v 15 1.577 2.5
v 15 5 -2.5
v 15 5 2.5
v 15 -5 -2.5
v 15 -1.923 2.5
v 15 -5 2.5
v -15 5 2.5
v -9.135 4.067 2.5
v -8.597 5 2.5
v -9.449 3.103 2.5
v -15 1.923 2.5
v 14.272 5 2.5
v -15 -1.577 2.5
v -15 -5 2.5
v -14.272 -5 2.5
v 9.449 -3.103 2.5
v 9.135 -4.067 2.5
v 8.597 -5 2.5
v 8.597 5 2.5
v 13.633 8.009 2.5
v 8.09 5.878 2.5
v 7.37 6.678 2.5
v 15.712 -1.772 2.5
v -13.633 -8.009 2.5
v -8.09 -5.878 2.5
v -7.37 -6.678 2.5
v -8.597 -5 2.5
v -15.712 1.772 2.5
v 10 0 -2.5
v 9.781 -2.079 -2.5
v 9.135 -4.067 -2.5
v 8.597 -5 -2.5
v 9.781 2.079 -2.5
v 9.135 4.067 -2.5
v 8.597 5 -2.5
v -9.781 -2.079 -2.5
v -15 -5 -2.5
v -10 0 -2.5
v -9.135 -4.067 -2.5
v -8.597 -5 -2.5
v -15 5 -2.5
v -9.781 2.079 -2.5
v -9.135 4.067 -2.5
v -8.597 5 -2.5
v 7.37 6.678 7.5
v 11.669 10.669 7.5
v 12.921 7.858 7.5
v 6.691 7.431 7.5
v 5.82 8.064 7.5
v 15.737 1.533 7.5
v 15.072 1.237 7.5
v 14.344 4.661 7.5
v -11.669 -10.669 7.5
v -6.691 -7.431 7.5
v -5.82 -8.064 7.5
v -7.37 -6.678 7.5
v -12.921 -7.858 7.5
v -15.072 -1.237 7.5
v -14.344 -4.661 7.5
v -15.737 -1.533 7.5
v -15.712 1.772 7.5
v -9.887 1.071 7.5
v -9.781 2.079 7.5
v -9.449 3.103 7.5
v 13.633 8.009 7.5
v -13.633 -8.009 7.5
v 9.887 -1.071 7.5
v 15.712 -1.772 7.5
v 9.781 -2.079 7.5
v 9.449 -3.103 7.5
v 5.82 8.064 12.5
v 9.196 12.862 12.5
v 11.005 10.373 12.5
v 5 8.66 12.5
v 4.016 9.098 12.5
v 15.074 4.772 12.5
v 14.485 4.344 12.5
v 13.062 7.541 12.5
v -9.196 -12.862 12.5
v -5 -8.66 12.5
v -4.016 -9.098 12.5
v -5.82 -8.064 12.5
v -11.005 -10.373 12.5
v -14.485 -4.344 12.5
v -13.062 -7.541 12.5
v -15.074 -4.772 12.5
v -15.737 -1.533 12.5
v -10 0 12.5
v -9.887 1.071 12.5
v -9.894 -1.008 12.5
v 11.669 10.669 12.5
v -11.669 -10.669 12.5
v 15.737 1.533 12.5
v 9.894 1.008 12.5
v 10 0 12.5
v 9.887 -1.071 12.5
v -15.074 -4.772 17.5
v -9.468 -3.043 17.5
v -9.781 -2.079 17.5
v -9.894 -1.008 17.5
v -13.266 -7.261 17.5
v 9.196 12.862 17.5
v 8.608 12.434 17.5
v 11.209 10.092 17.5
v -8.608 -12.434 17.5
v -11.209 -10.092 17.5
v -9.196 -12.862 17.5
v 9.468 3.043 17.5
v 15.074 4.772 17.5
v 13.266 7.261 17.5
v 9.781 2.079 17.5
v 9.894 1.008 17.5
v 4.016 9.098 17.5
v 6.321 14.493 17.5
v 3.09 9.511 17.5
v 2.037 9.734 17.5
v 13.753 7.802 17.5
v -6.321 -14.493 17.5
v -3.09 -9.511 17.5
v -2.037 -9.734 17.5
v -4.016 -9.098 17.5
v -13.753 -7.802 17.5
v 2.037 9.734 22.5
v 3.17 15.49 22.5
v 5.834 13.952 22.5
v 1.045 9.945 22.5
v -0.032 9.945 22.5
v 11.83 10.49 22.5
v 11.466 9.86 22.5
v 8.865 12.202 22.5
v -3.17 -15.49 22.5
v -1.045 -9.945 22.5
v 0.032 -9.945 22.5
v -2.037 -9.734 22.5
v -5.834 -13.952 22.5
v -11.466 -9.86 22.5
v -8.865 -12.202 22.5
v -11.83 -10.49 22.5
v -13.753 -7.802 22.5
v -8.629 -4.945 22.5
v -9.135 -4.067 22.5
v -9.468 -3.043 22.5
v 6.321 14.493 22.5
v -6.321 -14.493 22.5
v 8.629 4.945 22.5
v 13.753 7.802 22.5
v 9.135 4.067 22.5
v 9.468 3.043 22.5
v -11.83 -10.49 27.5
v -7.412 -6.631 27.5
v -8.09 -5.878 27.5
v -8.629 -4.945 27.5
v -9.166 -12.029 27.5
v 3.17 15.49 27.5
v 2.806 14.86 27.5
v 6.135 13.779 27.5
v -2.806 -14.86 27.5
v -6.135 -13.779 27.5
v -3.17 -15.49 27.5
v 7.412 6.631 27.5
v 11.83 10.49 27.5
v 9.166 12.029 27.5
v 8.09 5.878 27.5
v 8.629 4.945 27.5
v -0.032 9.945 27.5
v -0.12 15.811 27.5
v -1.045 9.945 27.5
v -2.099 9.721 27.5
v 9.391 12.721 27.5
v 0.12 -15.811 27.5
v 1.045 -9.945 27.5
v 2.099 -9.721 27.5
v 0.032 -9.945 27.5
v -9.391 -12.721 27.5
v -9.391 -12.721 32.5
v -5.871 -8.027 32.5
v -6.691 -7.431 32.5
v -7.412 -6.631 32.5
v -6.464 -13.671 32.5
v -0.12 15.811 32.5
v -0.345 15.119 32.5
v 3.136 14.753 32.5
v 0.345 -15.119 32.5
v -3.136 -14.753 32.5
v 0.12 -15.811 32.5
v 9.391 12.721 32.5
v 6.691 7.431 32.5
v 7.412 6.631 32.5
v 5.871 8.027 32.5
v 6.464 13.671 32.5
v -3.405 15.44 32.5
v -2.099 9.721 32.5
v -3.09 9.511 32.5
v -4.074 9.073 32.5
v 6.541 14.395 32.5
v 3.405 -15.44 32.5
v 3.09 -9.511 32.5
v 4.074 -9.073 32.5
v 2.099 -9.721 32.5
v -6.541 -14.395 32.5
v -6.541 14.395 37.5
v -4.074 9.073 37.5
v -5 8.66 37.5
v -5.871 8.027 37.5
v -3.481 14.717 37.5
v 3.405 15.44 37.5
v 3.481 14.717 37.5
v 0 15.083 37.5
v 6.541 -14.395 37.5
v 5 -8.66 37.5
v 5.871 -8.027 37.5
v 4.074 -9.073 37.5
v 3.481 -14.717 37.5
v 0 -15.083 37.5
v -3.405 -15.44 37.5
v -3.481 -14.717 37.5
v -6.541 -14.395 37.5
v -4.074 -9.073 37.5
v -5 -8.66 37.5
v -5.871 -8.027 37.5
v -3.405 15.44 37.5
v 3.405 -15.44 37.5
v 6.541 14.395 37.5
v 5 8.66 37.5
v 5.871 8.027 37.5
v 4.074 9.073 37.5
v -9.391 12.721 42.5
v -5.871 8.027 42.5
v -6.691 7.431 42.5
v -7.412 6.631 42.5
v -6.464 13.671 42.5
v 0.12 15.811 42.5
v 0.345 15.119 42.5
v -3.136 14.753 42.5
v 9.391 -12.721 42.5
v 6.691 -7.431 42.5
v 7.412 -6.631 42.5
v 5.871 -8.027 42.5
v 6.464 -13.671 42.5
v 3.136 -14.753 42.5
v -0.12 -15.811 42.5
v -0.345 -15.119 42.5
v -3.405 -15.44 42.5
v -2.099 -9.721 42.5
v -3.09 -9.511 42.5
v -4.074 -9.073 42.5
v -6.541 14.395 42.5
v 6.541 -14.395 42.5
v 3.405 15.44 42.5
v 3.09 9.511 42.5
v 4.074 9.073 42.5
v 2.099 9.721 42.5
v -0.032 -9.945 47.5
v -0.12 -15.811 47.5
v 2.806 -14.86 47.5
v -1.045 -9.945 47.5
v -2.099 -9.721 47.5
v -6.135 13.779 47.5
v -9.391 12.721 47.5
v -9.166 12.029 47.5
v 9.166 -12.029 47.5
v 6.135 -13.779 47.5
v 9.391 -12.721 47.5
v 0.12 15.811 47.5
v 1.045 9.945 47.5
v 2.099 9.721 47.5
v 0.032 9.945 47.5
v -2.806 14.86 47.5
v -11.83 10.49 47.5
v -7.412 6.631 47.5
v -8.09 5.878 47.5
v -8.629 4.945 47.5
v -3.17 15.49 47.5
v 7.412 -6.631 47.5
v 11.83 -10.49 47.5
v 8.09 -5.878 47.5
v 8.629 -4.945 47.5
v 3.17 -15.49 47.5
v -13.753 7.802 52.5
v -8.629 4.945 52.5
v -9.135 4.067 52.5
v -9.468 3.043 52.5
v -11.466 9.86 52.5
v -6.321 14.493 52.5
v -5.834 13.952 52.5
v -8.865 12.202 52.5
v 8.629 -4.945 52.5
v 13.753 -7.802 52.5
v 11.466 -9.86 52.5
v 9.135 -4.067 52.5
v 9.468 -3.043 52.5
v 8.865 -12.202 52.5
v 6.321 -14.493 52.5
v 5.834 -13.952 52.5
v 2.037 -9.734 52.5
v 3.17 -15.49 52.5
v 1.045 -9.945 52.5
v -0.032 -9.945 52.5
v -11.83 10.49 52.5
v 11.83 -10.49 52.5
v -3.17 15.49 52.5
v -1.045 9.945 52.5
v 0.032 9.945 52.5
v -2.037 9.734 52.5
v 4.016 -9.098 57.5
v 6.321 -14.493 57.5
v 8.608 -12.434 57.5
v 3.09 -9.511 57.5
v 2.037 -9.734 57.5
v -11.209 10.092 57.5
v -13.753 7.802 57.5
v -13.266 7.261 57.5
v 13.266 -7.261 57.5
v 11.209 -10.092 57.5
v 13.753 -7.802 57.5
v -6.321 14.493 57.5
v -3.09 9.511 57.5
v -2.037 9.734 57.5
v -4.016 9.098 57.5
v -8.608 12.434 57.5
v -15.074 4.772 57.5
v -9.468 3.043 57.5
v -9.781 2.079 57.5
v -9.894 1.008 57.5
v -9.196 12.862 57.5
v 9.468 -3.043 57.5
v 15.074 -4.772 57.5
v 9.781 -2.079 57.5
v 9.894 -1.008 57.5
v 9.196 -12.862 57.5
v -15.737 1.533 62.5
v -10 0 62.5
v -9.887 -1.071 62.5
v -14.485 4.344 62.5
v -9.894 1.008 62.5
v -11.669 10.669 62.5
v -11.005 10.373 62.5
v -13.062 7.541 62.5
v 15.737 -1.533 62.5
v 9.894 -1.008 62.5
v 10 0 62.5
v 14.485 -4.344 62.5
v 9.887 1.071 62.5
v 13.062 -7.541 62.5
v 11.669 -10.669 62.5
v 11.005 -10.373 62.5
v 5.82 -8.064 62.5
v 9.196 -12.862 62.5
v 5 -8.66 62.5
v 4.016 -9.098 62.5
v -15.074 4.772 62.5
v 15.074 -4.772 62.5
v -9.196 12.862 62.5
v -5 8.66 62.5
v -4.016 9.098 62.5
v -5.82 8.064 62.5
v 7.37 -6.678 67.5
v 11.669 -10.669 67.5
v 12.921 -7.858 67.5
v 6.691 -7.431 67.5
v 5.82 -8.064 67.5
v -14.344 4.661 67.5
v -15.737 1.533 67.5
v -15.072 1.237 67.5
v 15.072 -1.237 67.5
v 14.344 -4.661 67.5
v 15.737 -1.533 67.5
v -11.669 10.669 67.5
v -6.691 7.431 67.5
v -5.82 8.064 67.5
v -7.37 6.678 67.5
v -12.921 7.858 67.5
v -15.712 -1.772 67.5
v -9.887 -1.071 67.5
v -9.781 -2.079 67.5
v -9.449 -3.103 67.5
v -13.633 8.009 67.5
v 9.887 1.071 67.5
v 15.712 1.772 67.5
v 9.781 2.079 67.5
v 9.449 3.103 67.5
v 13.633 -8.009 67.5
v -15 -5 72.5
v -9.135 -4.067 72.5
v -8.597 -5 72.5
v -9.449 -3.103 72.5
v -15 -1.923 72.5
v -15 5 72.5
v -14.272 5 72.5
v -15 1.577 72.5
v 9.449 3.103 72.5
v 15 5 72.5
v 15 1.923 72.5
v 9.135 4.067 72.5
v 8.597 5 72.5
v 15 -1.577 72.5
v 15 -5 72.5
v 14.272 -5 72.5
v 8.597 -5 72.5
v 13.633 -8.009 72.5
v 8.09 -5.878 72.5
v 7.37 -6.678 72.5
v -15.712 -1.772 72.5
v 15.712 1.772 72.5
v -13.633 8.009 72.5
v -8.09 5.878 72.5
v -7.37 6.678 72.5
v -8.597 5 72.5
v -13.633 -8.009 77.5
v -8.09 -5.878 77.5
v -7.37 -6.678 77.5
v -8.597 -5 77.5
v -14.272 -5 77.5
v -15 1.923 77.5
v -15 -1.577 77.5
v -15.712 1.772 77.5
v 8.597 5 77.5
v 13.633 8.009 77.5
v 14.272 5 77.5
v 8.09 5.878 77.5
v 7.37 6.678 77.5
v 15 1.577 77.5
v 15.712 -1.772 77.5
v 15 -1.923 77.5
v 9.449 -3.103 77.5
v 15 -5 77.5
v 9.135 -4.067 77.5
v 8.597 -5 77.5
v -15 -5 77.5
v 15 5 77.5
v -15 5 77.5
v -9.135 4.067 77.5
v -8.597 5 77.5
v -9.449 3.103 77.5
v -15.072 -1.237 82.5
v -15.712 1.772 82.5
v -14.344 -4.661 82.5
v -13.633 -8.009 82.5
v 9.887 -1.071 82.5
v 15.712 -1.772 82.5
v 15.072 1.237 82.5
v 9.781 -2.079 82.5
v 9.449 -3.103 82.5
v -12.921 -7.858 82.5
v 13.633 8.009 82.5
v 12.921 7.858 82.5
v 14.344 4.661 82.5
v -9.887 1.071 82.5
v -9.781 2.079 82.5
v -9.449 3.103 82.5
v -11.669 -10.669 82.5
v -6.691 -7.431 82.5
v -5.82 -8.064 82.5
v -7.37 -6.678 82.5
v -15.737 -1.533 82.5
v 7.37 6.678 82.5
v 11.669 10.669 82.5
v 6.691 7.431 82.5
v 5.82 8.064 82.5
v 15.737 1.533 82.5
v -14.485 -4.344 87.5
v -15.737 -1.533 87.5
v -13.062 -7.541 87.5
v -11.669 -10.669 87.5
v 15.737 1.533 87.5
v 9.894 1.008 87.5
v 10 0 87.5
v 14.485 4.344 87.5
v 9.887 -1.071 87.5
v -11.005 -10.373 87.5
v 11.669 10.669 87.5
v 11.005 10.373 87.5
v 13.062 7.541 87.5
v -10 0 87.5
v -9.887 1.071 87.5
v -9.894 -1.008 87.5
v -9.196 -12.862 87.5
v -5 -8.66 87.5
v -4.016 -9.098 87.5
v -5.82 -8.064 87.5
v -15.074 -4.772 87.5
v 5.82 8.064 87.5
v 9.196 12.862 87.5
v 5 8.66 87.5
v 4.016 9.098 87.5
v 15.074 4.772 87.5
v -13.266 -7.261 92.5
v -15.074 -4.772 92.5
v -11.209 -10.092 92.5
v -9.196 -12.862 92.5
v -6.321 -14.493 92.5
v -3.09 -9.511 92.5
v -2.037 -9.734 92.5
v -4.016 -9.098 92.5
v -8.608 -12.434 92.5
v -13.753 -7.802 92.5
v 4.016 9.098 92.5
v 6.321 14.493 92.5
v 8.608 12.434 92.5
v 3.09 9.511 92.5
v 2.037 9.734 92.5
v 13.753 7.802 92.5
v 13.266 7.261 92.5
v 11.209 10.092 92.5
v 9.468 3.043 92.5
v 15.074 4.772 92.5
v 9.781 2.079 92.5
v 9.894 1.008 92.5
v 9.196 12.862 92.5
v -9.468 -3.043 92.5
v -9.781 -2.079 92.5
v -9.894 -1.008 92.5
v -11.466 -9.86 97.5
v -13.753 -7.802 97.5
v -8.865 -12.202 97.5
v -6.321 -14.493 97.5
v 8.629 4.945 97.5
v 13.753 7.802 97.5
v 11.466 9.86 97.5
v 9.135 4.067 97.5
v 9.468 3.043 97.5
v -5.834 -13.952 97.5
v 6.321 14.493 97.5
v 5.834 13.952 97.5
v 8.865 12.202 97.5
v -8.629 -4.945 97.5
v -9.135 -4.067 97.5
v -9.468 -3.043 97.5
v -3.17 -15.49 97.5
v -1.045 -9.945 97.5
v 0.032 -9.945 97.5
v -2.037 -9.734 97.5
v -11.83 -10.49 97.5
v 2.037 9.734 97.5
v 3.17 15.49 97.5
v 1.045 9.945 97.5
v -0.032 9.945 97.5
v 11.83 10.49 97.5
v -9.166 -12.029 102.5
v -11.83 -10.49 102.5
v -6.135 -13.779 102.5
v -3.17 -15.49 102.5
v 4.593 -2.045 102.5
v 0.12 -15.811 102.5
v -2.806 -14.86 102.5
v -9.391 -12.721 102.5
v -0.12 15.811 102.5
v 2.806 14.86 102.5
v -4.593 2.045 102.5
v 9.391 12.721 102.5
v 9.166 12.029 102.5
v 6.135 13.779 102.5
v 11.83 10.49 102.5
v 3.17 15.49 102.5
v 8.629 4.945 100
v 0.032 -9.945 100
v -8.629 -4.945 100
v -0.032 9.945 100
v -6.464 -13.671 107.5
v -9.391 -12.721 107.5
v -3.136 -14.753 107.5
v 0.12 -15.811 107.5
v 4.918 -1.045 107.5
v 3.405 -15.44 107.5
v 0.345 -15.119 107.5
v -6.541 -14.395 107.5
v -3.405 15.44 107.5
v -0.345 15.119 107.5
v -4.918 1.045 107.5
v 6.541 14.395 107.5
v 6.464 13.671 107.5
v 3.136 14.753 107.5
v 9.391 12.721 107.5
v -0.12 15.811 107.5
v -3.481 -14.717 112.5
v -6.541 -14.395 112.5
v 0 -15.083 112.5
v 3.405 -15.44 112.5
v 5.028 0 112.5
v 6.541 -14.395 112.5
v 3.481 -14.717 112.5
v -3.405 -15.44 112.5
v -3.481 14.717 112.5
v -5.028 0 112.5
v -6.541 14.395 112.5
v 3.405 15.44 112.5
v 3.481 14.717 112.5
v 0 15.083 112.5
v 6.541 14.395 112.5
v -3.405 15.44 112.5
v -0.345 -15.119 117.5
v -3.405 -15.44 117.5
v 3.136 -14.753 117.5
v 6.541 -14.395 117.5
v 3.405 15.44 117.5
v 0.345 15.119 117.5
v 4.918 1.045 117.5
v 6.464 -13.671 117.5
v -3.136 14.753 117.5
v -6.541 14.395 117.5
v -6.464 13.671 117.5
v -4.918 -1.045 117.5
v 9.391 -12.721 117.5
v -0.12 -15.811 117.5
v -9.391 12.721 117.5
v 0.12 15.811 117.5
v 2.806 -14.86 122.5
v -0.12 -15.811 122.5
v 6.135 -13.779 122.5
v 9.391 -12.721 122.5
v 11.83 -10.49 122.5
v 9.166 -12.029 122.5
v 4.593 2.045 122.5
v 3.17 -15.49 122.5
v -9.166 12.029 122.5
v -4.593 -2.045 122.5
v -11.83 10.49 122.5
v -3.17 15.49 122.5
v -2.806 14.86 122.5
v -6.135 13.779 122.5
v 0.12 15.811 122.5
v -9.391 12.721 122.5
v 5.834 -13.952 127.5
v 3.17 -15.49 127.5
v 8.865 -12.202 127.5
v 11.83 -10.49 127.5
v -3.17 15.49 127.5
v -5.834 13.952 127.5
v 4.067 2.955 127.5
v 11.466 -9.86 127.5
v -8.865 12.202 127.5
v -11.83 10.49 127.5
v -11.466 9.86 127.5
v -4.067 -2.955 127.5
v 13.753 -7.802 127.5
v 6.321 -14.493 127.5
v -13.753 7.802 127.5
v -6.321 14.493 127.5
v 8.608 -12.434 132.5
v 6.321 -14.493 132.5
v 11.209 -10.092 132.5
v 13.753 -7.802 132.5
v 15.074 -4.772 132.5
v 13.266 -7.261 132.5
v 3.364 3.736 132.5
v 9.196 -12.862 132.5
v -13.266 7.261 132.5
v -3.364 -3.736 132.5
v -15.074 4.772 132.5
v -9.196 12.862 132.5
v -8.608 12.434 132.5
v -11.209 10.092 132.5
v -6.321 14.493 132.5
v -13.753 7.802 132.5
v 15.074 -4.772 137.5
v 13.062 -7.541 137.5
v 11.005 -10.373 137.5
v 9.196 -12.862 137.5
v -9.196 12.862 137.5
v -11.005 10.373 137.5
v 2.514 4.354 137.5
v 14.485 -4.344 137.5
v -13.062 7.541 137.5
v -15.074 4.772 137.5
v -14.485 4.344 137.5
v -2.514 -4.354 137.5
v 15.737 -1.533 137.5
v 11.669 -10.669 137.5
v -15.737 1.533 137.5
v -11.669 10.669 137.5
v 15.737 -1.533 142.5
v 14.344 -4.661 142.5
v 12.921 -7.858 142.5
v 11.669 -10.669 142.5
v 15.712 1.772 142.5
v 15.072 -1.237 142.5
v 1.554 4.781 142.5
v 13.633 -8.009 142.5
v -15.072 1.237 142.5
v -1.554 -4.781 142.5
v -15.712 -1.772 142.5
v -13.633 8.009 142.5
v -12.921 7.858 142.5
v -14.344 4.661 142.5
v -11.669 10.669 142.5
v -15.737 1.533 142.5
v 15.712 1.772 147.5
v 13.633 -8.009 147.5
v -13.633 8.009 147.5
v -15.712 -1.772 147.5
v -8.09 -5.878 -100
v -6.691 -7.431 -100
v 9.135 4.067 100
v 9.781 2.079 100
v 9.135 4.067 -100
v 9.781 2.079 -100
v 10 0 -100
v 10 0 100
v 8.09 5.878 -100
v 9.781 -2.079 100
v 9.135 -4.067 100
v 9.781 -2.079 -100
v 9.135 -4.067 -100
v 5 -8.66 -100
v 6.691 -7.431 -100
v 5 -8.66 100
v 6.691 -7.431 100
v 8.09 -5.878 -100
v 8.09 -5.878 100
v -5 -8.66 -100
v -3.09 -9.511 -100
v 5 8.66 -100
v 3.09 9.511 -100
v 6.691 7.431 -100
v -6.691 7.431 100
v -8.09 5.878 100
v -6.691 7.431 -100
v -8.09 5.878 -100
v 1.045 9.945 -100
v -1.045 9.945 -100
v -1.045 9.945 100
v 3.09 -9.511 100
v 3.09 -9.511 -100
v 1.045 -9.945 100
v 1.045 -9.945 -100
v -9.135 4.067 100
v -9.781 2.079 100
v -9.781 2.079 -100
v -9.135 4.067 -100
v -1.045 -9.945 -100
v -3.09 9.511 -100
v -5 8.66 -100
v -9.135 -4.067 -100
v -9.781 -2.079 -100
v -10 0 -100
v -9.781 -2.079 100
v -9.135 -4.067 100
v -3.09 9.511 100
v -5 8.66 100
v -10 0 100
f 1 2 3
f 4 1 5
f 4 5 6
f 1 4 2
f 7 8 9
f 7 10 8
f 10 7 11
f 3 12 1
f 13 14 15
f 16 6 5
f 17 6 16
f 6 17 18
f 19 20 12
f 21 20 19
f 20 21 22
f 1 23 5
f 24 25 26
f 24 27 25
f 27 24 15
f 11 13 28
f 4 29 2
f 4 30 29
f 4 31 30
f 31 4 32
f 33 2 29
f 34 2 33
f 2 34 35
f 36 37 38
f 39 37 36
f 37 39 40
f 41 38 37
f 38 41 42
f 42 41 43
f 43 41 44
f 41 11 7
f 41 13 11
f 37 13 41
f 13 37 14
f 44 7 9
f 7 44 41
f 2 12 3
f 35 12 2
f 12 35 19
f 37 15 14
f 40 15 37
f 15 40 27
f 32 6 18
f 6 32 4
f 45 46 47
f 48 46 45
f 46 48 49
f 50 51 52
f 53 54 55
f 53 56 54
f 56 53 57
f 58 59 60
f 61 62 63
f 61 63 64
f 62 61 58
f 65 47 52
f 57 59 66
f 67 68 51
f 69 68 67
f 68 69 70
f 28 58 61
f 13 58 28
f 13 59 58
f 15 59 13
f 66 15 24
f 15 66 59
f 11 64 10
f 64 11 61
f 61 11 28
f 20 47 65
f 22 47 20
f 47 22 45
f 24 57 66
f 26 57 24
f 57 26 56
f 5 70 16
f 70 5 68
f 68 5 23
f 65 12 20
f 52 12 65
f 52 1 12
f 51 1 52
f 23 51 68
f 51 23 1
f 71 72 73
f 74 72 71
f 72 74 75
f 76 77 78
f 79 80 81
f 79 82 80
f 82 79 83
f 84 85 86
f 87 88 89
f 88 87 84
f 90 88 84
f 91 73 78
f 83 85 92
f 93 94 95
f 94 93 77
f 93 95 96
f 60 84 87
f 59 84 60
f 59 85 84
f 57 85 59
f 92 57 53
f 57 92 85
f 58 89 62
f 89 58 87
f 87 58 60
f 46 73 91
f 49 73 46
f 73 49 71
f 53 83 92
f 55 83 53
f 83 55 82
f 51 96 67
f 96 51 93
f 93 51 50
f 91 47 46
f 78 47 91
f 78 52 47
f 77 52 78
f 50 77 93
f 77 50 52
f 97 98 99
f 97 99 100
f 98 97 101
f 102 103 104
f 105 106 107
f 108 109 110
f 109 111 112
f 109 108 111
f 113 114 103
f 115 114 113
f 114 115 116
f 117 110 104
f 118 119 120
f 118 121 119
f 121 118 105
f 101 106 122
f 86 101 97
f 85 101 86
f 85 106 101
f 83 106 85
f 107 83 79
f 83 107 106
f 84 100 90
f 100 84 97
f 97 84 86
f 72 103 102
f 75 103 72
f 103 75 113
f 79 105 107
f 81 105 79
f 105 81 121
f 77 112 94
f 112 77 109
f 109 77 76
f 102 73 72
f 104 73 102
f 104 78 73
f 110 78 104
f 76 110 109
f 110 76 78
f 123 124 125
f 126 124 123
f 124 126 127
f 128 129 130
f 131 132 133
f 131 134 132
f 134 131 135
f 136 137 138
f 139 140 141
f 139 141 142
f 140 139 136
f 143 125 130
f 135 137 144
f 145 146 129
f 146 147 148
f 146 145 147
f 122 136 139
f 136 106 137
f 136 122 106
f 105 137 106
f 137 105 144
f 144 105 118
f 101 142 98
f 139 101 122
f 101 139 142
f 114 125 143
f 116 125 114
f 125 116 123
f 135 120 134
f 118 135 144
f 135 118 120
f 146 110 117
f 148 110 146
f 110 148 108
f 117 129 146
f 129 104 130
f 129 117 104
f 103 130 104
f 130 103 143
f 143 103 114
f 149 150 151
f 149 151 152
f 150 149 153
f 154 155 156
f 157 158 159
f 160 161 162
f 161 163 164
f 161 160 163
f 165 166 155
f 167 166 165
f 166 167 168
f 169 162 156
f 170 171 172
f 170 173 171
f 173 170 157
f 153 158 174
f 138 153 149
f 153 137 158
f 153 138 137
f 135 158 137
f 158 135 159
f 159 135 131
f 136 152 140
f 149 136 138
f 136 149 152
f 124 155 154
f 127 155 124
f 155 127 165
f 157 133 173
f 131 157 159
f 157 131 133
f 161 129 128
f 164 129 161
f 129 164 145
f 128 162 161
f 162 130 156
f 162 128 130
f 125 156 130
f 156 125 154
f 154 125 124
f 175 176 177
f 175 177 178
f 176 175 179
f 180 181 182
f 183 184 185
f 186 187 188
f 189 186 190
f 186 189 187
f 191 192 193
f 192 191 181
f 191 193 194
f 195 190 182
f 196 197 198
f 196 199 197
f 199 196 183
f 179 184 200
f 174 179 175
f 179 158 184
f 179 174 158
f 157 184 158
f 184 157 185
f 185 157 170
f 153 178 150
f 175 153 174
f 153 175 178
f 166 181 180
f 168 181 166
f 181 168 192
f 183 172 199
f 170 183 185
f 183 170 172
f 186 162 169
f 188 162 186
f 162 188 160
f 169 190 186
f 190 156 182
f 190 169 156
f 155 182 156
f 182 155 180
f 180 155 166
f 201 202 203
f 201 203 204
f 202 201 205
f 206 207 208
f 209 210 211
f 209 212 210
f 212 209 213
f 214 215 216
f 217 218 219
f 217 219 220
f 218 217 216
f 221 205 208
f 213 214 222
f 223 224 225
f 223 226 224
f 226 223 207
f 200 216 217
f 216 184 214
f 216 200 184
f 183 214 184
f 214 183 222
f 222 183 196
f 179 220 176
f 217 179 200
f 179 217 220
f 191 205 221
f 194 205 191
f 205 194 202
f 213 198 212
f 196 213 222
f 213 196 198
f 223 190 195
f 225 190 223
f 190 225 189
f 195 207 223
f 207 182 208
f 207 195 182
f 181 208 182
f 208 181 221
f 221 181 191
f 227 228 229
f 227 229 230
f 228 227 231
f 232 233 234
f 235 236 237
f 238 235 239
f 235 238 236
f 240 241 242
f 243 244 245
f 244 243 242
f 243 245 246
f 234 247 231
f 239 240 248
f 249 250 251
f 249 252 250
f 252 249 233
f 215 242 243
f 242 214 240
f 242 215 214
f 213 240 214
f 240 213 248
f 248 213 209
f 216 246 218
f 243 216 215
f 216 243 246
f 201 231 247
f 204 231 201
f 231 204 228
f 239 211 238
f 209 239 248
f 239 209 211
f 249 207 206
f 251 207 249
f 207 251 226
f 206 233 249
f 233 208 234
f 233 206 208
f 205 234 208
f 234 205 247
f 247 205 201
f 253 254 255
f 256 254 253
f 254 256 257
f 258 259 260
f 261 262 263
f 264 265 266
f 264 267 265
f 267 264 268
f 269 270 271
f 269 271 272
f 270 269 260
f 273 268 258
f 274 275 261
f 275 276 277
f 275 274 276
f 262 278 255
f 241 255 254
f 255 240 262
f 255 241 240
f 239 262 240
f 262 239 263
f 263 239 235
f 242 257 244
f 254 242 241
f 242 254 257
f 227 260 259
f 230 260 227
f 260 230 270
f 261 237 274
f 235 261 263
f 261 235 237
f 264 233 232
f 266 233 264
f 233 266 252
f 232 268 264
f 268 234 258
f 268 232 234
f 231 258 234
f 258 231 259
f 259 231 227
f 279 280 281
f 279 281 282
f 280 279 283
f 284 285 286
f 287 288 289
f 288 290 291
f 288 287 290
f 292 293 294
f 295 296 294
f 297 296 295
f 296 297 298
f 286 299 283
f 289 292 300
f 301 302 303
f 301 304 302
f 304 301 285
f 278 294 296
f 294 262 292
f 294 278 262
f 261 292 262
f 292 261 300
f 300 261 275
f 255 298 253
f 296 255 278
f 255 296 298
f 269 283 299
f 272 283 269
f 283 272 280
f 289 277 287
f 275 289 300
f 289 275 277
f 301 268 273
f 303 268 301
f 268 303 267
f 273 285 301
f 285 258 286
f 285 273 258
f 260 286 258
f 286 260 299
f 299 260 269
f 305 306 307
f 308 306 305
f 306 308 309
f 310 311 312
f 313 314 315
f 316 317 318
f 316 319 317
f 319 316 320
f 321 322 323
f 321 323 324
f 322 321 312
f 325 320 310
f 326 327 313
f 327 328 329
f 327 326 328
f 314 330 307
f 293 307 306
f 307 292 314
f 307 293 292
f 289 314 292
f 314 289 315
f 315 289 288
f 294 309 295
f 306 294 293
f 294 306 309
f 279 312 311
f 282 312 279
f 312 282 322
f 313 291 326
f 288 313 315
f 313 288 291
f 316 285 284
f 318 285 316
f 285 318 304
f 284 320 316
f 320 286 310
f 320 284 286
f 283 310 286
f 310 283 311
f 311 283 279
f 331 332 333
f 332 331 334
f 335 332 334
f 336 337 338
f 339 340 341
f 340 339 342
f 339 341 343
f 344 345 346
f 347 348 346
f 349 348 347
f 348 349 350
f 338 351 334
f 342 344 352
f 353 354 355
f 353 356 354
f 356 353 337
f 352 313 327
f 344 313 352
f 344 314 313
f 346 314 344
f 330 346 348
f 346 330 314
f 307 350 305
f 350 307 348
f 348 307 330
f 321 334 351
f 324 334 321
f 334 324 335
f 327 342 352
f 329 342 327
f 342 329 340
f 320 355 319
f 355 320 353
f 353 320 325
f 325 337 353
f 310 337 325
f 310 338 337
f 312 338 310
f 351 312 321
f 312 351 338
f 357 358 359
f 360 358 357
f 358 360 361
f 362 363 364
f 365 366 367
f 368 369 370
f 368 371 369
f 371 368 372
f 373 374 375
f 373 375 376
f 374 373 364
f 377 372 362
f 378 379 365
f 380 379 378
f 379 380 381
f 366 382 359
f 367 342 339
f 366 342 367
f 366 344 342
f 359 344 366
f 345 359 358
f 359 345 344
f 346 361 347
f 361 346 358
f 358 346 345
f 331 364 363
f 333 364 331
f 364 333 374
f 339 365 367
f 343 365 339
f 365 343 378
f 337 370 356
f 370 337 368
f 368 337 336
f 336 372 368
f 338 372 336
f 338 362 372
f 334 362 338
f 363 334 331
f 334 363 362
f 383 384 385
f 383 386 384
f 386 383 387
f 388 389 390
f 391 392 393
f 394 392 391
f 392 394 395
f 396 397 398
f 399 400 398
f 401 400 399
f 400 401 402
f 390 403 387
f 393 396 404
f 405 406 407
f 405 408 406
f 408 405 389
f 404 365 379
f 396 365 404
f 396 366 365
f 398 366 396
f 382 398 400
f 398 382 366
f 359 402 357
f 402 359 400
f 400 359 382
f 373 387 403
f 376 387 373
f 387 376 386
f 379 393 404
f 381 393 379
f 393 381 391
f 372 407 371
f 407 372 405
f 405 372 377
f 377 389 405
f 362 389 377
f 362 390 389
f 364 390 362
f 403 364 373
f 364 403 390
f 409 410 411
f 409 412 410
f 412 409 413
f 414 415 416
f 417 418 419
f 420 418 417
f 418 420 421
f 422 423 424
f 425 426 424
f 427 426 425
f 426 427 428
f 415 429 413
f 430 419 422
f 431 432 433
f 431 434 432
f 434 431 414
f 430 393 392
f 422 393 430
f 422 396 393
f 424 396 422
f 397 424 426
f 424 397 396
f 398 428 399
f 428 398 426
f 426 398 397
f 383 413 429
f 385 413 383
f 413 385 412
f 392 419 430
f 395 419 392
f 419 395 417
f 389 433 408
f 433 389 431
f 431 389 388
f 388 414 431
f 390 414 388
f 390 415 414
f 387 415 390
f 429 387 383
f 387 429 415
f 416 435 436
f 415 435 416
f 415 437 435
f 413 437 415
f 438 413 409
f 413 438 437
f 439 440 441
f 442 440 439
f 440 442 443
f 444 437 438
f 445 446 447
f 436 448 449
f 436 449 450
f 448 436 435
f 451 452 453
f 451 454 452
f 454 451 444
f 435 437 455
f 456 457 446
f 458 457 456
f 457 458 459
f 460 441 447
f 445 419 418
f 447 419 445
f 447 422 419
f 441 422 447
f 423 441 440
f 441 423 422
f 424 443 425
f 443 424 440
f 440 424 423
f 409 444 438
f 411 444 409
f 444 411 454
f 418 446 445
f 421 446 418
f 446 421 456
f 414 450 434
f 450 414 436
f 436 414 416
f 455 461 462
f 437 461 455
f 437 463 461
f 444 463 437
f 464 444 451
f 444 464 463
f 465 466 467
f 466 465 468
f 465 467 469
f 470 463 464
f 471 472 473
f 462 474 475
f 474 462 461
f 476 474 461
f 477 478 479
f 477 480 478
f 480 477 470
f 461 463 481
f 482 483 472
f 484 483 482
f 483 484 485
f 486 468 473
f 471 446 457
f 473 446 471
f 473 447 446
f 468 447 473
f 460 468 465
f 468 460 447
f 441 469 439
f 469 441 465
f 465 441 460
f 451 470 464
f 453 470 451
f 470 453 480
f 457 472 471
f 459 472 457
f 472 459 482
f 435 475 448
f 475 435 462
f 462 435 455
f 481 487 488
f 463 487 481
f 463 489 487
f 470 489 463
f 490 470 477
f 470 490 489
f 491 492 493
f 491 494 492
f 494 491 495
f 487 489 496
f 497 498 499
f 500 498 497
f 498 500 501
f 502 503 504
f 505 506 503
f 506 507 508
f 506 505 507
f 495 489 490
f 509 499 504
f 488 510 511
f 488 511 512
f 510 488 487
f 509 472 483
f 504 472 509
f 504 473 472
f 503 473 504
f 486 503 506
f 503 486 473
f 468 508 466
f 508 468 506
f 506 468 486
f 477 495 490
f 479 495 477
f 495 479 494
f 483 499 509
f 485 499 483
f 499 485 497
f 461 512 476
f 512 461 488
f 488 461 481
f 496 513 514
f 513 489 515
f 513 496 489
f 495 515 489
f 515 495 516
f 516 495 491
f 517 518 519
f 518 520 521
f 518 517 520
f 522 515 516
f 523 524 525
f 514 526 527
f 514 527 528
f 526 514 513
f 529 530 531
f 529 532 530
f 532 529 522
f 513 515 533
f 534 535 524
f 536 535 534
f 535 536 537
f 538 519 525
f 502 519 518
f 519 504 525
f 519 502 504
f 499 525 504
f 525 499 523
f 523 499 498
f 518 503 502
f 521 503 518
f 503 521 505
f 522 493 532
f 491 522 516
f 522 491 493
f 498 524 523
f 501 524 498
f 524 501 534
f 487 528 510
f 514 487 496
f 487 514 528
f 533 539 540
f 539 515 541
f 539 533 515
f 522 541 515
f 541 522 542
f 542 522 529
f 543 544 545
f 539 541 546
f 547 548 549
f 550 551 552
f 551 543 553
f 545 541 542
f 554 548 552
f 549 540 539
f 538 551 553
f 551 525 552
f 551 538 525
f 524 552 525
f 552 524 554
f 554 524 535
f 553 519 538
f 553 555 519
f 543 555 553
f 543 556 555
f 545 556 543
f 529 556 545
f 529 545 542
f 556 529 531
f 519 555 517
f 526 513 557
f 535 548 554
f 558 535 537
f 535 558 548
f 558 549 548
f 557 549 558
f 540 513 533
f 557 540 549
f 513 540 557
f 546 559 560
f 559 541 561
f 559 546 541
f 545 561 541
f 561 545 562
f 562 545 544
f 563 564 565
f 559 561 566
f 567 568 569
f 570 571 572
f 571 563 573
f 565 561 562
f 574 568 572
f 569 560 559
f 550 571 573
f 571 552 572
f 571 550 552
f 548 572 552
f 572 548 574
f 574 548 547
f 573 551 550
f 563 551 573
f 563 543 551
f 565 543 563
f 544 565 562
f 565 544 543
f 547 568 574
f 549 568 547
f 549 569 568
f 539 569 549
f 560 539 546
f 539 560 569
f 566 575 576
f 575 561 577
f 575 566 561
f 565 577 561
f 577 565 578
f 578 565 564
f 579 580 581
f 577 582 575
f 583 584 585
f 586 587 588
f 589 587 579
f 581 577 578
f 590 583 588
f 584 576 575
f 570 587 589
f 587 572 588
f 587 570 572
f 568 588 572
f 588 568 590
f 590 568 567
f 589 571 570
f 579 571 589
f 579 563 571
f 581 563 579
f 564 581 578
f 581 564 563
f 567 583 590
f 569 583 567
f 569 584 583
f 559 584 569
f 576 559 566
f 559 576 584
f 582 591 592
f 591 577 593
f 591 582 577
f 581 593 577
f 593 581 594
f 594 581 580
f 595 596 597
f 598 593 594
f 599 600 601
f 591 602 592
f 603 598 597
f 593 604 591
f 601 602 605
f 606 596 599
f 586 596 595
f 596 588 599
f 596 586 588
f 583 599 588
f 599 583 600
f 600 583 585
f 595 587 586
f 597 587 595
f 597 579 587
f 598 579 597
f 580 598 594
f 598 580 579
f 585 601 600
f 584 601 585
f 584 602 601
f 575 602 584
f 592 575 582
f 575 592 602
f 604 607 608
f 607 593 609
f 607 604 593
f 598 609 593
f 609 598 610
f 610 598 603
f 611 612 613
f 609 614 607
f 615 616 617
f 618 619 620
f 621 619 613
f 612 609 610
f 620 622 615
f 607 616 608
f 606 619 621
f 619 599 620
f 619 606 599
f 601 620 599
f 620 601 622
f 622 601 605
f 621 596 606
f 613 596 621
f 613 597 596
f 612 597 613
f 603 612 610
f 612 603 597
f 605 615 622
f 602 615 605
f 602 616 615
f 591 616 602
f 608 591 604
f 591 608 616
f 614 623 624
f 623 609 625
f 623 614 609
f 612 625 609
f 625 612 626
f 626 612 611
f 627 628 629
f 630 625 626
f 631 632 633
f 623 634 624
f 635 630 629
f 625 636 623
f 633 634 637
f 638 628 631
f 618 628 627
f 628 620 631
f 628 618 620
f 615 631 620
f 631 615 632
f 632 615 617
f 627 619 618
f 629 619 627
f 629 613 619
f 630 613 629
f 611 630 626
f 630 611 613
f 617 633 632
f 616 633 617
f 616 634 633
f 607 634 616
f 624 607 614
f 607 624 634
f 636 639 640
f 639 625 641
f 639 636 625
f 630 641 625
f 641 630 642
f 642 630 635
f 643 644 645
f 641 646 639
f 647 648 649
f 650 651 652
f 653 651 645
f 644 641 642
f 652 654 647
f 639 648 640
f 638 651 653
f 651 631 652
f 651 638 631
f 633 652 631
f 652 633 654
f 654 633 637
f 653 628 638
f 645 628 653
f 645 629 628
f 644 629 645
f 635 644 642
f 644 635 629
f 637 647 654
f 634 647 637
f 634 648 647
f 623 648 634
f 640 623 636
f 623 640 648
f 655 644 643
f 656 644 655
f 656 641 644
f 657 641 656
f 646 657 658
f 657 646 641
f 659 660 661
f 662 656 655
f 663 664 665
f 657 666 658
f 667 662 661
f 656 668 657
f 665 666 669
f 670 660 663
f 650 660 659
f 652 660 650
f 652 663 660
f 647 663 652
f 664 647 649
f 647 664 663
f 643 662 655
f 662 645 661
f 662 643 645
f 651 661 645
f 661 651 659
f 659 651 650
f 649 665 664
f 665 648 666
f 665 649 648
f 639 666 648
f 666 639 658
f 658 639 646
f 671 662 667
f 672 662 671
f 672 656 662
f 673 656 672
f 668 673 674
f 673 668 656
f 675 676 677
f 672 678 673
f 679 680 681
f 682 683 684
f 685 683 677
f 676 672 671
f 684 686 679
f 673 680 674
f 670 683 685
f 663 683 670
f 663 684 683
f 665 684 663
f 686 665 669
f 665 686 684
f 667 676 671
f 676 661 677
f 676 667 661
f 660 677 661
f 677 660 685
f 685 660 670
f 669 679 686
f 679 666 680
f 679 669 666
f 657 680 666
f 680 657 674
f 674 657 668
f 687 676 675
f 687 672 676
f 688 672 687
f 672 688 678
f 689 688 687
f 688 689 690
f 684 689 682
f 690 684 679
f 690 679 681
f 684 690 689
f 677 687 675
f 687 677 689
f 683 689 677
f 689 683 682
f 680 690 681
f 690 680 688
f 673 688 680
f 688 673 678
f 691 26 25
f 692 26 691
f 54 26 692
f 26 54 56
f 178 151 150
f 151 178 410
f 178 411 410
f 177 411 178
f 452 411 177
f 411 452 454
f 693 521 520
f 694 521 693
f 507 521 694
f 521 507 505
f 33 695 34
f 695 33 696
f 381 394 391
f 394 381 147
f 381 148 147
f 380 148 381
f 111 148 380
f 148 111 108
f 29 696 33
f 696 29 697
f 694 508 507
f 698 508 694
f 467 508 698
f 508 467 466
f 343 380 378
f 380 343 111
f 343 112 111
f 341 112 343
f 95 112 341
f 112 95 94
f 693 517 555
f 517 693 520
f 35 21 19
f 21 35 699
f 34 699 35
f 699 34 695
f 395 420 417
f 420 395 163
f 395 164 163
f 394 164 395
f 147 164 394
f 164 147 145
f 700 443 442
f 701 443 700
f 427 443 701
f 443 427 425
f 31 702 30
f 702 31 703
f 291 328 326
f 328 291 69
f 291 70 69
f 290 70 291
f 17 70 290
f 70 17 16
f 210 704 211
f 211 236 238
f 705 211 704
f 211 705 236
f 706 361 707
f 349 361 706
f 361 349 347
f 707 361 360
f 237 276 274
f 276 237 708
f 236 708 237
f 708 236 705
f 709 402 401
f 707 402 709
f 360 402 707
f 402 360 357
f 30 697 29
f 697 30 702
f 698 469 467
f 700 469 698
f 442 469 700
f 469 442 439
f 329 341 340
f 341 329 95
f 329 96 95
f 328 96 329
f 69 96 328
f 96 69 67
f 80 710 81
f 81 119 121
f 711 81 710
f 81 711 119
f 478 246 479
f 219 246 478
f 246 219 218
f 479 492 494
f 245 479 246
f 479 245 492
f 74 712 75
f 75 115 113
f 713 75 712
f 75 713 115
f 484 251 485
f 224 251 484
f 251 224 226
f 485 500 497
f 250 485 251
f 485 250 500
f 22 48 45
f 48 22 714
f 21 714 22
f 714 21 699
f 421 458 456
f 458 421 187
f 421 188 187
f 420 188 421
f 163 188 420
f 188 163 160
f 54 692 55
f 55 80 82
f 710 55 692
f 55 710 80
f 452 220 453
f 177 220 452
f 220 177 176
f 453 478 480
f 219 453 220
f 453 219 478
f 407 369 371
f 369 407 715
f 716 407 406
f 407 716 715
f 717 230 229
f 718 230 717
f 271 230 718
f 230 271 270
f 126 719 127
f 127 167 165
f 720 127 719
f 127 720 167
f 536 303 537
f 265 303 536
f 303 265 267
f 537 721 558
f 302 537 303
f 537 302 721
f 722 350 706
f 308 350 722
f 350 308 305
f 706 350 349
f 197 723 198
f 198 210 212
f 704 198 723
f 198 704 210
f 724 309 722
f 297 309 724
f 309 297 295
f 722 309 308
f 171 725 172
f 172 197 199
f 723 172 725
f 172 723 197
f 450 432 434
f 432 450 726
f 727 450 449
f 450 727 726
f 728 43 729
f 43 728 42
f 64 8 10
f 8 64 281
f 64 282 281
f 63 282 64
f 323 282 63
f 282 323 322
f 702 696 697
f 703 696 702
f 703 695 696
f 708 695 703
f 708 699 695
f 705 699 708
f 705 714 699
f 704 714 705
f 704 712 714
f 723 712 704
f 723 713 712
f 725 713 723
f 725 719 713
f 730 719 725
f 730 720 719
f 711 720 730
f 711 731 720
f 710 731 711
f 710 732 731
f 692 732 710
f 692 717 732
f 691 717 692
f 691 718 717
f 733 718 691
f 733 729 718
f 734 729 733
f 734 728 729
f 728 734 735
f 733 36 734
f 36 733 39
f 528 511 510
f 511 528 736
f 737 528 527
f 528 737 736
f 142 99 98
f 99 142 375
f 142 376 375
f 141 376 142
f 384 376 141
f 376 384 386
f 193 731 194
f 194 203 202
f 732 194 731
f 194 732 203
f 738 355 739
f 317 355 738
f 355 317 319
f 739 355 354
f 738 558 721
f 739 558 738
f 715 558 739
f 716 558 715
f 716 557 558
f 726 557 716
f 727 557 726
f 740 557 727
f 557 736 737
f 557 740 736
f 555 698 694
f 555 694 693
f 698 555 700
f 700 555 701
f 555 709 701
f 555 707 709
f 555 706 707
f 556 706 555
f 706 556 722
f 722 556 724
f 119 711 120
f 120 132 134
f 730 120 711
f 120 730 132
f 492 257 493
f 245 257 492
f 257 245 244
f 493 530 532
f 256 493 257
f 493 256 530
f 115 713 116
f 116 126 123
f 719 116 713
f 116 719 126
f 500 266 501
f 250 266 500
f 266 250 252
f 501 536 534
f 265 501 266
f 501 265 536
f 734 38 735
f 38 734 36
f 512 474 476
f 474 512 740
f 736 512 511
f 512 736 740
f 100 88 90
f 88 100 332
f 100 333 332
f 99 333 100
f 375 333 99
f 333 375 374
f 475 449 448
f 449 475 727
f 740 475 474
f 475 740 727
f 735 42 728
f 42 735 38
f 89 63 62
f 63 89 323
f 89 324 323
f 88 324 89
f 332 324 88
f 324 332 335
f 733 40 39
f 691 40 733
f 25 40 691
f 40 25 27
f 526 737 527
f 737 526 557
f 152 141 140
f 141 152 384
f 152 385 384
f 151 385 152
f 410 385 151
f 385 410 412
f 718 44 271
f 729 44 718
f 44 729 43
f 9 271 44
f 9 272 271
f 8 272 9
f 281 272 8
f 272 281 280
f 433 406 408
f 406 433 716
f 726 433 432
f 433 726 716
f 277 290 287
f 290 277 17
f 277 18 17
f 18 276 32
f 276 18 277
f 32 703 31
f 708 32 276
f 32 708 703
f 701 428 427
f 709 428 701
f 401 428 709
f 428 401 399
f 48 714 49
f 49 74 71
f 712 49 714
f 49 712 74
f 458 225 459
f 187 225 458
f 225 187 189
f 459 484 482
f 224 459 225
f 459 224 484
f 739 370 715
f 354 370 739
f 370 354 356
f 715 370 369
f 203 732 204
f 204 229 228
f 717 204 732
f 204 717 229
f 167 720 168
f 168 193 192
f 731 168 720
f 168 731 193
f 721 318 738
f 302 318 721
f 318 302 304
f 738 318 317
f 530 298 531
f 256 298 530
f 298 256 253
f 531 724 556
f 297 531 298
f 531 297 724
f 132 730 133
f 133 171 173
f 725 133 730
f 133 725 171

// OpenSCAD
// Auto-generated Code Vault for 'ParametricSpiralStaircase' [Openscad]

module ParametricSpiralStaircase(
    num_steps = 30,
    step_width = 30,
    step_depth = 10,
    step_height = 5,
    pillar_radius = 10,
    pillar_height = 200
) {
    // Draw central cylindrical pillar
    cylinder(h = pillar_height, r = pillar_radius, center = true);

    // Calculate angle increment for each step
    angle_increment = 360 / num_steps;

    // Generate steps using a for-loop
    for (i = [0 : num_steps - 1]) {
        // Calculate rotation angle and translation for current step
        rotation_angle = i * angle_increment;
        translation_z = i * step_height;

        // Draw current step
        translate([0, 0, translation_z])
        rotate([0, 0, rotation_angle])
        cube([step_width, step_depth, step_height], center = true);
    }
}

// Example usage
ParametricSpiralStaircase();
